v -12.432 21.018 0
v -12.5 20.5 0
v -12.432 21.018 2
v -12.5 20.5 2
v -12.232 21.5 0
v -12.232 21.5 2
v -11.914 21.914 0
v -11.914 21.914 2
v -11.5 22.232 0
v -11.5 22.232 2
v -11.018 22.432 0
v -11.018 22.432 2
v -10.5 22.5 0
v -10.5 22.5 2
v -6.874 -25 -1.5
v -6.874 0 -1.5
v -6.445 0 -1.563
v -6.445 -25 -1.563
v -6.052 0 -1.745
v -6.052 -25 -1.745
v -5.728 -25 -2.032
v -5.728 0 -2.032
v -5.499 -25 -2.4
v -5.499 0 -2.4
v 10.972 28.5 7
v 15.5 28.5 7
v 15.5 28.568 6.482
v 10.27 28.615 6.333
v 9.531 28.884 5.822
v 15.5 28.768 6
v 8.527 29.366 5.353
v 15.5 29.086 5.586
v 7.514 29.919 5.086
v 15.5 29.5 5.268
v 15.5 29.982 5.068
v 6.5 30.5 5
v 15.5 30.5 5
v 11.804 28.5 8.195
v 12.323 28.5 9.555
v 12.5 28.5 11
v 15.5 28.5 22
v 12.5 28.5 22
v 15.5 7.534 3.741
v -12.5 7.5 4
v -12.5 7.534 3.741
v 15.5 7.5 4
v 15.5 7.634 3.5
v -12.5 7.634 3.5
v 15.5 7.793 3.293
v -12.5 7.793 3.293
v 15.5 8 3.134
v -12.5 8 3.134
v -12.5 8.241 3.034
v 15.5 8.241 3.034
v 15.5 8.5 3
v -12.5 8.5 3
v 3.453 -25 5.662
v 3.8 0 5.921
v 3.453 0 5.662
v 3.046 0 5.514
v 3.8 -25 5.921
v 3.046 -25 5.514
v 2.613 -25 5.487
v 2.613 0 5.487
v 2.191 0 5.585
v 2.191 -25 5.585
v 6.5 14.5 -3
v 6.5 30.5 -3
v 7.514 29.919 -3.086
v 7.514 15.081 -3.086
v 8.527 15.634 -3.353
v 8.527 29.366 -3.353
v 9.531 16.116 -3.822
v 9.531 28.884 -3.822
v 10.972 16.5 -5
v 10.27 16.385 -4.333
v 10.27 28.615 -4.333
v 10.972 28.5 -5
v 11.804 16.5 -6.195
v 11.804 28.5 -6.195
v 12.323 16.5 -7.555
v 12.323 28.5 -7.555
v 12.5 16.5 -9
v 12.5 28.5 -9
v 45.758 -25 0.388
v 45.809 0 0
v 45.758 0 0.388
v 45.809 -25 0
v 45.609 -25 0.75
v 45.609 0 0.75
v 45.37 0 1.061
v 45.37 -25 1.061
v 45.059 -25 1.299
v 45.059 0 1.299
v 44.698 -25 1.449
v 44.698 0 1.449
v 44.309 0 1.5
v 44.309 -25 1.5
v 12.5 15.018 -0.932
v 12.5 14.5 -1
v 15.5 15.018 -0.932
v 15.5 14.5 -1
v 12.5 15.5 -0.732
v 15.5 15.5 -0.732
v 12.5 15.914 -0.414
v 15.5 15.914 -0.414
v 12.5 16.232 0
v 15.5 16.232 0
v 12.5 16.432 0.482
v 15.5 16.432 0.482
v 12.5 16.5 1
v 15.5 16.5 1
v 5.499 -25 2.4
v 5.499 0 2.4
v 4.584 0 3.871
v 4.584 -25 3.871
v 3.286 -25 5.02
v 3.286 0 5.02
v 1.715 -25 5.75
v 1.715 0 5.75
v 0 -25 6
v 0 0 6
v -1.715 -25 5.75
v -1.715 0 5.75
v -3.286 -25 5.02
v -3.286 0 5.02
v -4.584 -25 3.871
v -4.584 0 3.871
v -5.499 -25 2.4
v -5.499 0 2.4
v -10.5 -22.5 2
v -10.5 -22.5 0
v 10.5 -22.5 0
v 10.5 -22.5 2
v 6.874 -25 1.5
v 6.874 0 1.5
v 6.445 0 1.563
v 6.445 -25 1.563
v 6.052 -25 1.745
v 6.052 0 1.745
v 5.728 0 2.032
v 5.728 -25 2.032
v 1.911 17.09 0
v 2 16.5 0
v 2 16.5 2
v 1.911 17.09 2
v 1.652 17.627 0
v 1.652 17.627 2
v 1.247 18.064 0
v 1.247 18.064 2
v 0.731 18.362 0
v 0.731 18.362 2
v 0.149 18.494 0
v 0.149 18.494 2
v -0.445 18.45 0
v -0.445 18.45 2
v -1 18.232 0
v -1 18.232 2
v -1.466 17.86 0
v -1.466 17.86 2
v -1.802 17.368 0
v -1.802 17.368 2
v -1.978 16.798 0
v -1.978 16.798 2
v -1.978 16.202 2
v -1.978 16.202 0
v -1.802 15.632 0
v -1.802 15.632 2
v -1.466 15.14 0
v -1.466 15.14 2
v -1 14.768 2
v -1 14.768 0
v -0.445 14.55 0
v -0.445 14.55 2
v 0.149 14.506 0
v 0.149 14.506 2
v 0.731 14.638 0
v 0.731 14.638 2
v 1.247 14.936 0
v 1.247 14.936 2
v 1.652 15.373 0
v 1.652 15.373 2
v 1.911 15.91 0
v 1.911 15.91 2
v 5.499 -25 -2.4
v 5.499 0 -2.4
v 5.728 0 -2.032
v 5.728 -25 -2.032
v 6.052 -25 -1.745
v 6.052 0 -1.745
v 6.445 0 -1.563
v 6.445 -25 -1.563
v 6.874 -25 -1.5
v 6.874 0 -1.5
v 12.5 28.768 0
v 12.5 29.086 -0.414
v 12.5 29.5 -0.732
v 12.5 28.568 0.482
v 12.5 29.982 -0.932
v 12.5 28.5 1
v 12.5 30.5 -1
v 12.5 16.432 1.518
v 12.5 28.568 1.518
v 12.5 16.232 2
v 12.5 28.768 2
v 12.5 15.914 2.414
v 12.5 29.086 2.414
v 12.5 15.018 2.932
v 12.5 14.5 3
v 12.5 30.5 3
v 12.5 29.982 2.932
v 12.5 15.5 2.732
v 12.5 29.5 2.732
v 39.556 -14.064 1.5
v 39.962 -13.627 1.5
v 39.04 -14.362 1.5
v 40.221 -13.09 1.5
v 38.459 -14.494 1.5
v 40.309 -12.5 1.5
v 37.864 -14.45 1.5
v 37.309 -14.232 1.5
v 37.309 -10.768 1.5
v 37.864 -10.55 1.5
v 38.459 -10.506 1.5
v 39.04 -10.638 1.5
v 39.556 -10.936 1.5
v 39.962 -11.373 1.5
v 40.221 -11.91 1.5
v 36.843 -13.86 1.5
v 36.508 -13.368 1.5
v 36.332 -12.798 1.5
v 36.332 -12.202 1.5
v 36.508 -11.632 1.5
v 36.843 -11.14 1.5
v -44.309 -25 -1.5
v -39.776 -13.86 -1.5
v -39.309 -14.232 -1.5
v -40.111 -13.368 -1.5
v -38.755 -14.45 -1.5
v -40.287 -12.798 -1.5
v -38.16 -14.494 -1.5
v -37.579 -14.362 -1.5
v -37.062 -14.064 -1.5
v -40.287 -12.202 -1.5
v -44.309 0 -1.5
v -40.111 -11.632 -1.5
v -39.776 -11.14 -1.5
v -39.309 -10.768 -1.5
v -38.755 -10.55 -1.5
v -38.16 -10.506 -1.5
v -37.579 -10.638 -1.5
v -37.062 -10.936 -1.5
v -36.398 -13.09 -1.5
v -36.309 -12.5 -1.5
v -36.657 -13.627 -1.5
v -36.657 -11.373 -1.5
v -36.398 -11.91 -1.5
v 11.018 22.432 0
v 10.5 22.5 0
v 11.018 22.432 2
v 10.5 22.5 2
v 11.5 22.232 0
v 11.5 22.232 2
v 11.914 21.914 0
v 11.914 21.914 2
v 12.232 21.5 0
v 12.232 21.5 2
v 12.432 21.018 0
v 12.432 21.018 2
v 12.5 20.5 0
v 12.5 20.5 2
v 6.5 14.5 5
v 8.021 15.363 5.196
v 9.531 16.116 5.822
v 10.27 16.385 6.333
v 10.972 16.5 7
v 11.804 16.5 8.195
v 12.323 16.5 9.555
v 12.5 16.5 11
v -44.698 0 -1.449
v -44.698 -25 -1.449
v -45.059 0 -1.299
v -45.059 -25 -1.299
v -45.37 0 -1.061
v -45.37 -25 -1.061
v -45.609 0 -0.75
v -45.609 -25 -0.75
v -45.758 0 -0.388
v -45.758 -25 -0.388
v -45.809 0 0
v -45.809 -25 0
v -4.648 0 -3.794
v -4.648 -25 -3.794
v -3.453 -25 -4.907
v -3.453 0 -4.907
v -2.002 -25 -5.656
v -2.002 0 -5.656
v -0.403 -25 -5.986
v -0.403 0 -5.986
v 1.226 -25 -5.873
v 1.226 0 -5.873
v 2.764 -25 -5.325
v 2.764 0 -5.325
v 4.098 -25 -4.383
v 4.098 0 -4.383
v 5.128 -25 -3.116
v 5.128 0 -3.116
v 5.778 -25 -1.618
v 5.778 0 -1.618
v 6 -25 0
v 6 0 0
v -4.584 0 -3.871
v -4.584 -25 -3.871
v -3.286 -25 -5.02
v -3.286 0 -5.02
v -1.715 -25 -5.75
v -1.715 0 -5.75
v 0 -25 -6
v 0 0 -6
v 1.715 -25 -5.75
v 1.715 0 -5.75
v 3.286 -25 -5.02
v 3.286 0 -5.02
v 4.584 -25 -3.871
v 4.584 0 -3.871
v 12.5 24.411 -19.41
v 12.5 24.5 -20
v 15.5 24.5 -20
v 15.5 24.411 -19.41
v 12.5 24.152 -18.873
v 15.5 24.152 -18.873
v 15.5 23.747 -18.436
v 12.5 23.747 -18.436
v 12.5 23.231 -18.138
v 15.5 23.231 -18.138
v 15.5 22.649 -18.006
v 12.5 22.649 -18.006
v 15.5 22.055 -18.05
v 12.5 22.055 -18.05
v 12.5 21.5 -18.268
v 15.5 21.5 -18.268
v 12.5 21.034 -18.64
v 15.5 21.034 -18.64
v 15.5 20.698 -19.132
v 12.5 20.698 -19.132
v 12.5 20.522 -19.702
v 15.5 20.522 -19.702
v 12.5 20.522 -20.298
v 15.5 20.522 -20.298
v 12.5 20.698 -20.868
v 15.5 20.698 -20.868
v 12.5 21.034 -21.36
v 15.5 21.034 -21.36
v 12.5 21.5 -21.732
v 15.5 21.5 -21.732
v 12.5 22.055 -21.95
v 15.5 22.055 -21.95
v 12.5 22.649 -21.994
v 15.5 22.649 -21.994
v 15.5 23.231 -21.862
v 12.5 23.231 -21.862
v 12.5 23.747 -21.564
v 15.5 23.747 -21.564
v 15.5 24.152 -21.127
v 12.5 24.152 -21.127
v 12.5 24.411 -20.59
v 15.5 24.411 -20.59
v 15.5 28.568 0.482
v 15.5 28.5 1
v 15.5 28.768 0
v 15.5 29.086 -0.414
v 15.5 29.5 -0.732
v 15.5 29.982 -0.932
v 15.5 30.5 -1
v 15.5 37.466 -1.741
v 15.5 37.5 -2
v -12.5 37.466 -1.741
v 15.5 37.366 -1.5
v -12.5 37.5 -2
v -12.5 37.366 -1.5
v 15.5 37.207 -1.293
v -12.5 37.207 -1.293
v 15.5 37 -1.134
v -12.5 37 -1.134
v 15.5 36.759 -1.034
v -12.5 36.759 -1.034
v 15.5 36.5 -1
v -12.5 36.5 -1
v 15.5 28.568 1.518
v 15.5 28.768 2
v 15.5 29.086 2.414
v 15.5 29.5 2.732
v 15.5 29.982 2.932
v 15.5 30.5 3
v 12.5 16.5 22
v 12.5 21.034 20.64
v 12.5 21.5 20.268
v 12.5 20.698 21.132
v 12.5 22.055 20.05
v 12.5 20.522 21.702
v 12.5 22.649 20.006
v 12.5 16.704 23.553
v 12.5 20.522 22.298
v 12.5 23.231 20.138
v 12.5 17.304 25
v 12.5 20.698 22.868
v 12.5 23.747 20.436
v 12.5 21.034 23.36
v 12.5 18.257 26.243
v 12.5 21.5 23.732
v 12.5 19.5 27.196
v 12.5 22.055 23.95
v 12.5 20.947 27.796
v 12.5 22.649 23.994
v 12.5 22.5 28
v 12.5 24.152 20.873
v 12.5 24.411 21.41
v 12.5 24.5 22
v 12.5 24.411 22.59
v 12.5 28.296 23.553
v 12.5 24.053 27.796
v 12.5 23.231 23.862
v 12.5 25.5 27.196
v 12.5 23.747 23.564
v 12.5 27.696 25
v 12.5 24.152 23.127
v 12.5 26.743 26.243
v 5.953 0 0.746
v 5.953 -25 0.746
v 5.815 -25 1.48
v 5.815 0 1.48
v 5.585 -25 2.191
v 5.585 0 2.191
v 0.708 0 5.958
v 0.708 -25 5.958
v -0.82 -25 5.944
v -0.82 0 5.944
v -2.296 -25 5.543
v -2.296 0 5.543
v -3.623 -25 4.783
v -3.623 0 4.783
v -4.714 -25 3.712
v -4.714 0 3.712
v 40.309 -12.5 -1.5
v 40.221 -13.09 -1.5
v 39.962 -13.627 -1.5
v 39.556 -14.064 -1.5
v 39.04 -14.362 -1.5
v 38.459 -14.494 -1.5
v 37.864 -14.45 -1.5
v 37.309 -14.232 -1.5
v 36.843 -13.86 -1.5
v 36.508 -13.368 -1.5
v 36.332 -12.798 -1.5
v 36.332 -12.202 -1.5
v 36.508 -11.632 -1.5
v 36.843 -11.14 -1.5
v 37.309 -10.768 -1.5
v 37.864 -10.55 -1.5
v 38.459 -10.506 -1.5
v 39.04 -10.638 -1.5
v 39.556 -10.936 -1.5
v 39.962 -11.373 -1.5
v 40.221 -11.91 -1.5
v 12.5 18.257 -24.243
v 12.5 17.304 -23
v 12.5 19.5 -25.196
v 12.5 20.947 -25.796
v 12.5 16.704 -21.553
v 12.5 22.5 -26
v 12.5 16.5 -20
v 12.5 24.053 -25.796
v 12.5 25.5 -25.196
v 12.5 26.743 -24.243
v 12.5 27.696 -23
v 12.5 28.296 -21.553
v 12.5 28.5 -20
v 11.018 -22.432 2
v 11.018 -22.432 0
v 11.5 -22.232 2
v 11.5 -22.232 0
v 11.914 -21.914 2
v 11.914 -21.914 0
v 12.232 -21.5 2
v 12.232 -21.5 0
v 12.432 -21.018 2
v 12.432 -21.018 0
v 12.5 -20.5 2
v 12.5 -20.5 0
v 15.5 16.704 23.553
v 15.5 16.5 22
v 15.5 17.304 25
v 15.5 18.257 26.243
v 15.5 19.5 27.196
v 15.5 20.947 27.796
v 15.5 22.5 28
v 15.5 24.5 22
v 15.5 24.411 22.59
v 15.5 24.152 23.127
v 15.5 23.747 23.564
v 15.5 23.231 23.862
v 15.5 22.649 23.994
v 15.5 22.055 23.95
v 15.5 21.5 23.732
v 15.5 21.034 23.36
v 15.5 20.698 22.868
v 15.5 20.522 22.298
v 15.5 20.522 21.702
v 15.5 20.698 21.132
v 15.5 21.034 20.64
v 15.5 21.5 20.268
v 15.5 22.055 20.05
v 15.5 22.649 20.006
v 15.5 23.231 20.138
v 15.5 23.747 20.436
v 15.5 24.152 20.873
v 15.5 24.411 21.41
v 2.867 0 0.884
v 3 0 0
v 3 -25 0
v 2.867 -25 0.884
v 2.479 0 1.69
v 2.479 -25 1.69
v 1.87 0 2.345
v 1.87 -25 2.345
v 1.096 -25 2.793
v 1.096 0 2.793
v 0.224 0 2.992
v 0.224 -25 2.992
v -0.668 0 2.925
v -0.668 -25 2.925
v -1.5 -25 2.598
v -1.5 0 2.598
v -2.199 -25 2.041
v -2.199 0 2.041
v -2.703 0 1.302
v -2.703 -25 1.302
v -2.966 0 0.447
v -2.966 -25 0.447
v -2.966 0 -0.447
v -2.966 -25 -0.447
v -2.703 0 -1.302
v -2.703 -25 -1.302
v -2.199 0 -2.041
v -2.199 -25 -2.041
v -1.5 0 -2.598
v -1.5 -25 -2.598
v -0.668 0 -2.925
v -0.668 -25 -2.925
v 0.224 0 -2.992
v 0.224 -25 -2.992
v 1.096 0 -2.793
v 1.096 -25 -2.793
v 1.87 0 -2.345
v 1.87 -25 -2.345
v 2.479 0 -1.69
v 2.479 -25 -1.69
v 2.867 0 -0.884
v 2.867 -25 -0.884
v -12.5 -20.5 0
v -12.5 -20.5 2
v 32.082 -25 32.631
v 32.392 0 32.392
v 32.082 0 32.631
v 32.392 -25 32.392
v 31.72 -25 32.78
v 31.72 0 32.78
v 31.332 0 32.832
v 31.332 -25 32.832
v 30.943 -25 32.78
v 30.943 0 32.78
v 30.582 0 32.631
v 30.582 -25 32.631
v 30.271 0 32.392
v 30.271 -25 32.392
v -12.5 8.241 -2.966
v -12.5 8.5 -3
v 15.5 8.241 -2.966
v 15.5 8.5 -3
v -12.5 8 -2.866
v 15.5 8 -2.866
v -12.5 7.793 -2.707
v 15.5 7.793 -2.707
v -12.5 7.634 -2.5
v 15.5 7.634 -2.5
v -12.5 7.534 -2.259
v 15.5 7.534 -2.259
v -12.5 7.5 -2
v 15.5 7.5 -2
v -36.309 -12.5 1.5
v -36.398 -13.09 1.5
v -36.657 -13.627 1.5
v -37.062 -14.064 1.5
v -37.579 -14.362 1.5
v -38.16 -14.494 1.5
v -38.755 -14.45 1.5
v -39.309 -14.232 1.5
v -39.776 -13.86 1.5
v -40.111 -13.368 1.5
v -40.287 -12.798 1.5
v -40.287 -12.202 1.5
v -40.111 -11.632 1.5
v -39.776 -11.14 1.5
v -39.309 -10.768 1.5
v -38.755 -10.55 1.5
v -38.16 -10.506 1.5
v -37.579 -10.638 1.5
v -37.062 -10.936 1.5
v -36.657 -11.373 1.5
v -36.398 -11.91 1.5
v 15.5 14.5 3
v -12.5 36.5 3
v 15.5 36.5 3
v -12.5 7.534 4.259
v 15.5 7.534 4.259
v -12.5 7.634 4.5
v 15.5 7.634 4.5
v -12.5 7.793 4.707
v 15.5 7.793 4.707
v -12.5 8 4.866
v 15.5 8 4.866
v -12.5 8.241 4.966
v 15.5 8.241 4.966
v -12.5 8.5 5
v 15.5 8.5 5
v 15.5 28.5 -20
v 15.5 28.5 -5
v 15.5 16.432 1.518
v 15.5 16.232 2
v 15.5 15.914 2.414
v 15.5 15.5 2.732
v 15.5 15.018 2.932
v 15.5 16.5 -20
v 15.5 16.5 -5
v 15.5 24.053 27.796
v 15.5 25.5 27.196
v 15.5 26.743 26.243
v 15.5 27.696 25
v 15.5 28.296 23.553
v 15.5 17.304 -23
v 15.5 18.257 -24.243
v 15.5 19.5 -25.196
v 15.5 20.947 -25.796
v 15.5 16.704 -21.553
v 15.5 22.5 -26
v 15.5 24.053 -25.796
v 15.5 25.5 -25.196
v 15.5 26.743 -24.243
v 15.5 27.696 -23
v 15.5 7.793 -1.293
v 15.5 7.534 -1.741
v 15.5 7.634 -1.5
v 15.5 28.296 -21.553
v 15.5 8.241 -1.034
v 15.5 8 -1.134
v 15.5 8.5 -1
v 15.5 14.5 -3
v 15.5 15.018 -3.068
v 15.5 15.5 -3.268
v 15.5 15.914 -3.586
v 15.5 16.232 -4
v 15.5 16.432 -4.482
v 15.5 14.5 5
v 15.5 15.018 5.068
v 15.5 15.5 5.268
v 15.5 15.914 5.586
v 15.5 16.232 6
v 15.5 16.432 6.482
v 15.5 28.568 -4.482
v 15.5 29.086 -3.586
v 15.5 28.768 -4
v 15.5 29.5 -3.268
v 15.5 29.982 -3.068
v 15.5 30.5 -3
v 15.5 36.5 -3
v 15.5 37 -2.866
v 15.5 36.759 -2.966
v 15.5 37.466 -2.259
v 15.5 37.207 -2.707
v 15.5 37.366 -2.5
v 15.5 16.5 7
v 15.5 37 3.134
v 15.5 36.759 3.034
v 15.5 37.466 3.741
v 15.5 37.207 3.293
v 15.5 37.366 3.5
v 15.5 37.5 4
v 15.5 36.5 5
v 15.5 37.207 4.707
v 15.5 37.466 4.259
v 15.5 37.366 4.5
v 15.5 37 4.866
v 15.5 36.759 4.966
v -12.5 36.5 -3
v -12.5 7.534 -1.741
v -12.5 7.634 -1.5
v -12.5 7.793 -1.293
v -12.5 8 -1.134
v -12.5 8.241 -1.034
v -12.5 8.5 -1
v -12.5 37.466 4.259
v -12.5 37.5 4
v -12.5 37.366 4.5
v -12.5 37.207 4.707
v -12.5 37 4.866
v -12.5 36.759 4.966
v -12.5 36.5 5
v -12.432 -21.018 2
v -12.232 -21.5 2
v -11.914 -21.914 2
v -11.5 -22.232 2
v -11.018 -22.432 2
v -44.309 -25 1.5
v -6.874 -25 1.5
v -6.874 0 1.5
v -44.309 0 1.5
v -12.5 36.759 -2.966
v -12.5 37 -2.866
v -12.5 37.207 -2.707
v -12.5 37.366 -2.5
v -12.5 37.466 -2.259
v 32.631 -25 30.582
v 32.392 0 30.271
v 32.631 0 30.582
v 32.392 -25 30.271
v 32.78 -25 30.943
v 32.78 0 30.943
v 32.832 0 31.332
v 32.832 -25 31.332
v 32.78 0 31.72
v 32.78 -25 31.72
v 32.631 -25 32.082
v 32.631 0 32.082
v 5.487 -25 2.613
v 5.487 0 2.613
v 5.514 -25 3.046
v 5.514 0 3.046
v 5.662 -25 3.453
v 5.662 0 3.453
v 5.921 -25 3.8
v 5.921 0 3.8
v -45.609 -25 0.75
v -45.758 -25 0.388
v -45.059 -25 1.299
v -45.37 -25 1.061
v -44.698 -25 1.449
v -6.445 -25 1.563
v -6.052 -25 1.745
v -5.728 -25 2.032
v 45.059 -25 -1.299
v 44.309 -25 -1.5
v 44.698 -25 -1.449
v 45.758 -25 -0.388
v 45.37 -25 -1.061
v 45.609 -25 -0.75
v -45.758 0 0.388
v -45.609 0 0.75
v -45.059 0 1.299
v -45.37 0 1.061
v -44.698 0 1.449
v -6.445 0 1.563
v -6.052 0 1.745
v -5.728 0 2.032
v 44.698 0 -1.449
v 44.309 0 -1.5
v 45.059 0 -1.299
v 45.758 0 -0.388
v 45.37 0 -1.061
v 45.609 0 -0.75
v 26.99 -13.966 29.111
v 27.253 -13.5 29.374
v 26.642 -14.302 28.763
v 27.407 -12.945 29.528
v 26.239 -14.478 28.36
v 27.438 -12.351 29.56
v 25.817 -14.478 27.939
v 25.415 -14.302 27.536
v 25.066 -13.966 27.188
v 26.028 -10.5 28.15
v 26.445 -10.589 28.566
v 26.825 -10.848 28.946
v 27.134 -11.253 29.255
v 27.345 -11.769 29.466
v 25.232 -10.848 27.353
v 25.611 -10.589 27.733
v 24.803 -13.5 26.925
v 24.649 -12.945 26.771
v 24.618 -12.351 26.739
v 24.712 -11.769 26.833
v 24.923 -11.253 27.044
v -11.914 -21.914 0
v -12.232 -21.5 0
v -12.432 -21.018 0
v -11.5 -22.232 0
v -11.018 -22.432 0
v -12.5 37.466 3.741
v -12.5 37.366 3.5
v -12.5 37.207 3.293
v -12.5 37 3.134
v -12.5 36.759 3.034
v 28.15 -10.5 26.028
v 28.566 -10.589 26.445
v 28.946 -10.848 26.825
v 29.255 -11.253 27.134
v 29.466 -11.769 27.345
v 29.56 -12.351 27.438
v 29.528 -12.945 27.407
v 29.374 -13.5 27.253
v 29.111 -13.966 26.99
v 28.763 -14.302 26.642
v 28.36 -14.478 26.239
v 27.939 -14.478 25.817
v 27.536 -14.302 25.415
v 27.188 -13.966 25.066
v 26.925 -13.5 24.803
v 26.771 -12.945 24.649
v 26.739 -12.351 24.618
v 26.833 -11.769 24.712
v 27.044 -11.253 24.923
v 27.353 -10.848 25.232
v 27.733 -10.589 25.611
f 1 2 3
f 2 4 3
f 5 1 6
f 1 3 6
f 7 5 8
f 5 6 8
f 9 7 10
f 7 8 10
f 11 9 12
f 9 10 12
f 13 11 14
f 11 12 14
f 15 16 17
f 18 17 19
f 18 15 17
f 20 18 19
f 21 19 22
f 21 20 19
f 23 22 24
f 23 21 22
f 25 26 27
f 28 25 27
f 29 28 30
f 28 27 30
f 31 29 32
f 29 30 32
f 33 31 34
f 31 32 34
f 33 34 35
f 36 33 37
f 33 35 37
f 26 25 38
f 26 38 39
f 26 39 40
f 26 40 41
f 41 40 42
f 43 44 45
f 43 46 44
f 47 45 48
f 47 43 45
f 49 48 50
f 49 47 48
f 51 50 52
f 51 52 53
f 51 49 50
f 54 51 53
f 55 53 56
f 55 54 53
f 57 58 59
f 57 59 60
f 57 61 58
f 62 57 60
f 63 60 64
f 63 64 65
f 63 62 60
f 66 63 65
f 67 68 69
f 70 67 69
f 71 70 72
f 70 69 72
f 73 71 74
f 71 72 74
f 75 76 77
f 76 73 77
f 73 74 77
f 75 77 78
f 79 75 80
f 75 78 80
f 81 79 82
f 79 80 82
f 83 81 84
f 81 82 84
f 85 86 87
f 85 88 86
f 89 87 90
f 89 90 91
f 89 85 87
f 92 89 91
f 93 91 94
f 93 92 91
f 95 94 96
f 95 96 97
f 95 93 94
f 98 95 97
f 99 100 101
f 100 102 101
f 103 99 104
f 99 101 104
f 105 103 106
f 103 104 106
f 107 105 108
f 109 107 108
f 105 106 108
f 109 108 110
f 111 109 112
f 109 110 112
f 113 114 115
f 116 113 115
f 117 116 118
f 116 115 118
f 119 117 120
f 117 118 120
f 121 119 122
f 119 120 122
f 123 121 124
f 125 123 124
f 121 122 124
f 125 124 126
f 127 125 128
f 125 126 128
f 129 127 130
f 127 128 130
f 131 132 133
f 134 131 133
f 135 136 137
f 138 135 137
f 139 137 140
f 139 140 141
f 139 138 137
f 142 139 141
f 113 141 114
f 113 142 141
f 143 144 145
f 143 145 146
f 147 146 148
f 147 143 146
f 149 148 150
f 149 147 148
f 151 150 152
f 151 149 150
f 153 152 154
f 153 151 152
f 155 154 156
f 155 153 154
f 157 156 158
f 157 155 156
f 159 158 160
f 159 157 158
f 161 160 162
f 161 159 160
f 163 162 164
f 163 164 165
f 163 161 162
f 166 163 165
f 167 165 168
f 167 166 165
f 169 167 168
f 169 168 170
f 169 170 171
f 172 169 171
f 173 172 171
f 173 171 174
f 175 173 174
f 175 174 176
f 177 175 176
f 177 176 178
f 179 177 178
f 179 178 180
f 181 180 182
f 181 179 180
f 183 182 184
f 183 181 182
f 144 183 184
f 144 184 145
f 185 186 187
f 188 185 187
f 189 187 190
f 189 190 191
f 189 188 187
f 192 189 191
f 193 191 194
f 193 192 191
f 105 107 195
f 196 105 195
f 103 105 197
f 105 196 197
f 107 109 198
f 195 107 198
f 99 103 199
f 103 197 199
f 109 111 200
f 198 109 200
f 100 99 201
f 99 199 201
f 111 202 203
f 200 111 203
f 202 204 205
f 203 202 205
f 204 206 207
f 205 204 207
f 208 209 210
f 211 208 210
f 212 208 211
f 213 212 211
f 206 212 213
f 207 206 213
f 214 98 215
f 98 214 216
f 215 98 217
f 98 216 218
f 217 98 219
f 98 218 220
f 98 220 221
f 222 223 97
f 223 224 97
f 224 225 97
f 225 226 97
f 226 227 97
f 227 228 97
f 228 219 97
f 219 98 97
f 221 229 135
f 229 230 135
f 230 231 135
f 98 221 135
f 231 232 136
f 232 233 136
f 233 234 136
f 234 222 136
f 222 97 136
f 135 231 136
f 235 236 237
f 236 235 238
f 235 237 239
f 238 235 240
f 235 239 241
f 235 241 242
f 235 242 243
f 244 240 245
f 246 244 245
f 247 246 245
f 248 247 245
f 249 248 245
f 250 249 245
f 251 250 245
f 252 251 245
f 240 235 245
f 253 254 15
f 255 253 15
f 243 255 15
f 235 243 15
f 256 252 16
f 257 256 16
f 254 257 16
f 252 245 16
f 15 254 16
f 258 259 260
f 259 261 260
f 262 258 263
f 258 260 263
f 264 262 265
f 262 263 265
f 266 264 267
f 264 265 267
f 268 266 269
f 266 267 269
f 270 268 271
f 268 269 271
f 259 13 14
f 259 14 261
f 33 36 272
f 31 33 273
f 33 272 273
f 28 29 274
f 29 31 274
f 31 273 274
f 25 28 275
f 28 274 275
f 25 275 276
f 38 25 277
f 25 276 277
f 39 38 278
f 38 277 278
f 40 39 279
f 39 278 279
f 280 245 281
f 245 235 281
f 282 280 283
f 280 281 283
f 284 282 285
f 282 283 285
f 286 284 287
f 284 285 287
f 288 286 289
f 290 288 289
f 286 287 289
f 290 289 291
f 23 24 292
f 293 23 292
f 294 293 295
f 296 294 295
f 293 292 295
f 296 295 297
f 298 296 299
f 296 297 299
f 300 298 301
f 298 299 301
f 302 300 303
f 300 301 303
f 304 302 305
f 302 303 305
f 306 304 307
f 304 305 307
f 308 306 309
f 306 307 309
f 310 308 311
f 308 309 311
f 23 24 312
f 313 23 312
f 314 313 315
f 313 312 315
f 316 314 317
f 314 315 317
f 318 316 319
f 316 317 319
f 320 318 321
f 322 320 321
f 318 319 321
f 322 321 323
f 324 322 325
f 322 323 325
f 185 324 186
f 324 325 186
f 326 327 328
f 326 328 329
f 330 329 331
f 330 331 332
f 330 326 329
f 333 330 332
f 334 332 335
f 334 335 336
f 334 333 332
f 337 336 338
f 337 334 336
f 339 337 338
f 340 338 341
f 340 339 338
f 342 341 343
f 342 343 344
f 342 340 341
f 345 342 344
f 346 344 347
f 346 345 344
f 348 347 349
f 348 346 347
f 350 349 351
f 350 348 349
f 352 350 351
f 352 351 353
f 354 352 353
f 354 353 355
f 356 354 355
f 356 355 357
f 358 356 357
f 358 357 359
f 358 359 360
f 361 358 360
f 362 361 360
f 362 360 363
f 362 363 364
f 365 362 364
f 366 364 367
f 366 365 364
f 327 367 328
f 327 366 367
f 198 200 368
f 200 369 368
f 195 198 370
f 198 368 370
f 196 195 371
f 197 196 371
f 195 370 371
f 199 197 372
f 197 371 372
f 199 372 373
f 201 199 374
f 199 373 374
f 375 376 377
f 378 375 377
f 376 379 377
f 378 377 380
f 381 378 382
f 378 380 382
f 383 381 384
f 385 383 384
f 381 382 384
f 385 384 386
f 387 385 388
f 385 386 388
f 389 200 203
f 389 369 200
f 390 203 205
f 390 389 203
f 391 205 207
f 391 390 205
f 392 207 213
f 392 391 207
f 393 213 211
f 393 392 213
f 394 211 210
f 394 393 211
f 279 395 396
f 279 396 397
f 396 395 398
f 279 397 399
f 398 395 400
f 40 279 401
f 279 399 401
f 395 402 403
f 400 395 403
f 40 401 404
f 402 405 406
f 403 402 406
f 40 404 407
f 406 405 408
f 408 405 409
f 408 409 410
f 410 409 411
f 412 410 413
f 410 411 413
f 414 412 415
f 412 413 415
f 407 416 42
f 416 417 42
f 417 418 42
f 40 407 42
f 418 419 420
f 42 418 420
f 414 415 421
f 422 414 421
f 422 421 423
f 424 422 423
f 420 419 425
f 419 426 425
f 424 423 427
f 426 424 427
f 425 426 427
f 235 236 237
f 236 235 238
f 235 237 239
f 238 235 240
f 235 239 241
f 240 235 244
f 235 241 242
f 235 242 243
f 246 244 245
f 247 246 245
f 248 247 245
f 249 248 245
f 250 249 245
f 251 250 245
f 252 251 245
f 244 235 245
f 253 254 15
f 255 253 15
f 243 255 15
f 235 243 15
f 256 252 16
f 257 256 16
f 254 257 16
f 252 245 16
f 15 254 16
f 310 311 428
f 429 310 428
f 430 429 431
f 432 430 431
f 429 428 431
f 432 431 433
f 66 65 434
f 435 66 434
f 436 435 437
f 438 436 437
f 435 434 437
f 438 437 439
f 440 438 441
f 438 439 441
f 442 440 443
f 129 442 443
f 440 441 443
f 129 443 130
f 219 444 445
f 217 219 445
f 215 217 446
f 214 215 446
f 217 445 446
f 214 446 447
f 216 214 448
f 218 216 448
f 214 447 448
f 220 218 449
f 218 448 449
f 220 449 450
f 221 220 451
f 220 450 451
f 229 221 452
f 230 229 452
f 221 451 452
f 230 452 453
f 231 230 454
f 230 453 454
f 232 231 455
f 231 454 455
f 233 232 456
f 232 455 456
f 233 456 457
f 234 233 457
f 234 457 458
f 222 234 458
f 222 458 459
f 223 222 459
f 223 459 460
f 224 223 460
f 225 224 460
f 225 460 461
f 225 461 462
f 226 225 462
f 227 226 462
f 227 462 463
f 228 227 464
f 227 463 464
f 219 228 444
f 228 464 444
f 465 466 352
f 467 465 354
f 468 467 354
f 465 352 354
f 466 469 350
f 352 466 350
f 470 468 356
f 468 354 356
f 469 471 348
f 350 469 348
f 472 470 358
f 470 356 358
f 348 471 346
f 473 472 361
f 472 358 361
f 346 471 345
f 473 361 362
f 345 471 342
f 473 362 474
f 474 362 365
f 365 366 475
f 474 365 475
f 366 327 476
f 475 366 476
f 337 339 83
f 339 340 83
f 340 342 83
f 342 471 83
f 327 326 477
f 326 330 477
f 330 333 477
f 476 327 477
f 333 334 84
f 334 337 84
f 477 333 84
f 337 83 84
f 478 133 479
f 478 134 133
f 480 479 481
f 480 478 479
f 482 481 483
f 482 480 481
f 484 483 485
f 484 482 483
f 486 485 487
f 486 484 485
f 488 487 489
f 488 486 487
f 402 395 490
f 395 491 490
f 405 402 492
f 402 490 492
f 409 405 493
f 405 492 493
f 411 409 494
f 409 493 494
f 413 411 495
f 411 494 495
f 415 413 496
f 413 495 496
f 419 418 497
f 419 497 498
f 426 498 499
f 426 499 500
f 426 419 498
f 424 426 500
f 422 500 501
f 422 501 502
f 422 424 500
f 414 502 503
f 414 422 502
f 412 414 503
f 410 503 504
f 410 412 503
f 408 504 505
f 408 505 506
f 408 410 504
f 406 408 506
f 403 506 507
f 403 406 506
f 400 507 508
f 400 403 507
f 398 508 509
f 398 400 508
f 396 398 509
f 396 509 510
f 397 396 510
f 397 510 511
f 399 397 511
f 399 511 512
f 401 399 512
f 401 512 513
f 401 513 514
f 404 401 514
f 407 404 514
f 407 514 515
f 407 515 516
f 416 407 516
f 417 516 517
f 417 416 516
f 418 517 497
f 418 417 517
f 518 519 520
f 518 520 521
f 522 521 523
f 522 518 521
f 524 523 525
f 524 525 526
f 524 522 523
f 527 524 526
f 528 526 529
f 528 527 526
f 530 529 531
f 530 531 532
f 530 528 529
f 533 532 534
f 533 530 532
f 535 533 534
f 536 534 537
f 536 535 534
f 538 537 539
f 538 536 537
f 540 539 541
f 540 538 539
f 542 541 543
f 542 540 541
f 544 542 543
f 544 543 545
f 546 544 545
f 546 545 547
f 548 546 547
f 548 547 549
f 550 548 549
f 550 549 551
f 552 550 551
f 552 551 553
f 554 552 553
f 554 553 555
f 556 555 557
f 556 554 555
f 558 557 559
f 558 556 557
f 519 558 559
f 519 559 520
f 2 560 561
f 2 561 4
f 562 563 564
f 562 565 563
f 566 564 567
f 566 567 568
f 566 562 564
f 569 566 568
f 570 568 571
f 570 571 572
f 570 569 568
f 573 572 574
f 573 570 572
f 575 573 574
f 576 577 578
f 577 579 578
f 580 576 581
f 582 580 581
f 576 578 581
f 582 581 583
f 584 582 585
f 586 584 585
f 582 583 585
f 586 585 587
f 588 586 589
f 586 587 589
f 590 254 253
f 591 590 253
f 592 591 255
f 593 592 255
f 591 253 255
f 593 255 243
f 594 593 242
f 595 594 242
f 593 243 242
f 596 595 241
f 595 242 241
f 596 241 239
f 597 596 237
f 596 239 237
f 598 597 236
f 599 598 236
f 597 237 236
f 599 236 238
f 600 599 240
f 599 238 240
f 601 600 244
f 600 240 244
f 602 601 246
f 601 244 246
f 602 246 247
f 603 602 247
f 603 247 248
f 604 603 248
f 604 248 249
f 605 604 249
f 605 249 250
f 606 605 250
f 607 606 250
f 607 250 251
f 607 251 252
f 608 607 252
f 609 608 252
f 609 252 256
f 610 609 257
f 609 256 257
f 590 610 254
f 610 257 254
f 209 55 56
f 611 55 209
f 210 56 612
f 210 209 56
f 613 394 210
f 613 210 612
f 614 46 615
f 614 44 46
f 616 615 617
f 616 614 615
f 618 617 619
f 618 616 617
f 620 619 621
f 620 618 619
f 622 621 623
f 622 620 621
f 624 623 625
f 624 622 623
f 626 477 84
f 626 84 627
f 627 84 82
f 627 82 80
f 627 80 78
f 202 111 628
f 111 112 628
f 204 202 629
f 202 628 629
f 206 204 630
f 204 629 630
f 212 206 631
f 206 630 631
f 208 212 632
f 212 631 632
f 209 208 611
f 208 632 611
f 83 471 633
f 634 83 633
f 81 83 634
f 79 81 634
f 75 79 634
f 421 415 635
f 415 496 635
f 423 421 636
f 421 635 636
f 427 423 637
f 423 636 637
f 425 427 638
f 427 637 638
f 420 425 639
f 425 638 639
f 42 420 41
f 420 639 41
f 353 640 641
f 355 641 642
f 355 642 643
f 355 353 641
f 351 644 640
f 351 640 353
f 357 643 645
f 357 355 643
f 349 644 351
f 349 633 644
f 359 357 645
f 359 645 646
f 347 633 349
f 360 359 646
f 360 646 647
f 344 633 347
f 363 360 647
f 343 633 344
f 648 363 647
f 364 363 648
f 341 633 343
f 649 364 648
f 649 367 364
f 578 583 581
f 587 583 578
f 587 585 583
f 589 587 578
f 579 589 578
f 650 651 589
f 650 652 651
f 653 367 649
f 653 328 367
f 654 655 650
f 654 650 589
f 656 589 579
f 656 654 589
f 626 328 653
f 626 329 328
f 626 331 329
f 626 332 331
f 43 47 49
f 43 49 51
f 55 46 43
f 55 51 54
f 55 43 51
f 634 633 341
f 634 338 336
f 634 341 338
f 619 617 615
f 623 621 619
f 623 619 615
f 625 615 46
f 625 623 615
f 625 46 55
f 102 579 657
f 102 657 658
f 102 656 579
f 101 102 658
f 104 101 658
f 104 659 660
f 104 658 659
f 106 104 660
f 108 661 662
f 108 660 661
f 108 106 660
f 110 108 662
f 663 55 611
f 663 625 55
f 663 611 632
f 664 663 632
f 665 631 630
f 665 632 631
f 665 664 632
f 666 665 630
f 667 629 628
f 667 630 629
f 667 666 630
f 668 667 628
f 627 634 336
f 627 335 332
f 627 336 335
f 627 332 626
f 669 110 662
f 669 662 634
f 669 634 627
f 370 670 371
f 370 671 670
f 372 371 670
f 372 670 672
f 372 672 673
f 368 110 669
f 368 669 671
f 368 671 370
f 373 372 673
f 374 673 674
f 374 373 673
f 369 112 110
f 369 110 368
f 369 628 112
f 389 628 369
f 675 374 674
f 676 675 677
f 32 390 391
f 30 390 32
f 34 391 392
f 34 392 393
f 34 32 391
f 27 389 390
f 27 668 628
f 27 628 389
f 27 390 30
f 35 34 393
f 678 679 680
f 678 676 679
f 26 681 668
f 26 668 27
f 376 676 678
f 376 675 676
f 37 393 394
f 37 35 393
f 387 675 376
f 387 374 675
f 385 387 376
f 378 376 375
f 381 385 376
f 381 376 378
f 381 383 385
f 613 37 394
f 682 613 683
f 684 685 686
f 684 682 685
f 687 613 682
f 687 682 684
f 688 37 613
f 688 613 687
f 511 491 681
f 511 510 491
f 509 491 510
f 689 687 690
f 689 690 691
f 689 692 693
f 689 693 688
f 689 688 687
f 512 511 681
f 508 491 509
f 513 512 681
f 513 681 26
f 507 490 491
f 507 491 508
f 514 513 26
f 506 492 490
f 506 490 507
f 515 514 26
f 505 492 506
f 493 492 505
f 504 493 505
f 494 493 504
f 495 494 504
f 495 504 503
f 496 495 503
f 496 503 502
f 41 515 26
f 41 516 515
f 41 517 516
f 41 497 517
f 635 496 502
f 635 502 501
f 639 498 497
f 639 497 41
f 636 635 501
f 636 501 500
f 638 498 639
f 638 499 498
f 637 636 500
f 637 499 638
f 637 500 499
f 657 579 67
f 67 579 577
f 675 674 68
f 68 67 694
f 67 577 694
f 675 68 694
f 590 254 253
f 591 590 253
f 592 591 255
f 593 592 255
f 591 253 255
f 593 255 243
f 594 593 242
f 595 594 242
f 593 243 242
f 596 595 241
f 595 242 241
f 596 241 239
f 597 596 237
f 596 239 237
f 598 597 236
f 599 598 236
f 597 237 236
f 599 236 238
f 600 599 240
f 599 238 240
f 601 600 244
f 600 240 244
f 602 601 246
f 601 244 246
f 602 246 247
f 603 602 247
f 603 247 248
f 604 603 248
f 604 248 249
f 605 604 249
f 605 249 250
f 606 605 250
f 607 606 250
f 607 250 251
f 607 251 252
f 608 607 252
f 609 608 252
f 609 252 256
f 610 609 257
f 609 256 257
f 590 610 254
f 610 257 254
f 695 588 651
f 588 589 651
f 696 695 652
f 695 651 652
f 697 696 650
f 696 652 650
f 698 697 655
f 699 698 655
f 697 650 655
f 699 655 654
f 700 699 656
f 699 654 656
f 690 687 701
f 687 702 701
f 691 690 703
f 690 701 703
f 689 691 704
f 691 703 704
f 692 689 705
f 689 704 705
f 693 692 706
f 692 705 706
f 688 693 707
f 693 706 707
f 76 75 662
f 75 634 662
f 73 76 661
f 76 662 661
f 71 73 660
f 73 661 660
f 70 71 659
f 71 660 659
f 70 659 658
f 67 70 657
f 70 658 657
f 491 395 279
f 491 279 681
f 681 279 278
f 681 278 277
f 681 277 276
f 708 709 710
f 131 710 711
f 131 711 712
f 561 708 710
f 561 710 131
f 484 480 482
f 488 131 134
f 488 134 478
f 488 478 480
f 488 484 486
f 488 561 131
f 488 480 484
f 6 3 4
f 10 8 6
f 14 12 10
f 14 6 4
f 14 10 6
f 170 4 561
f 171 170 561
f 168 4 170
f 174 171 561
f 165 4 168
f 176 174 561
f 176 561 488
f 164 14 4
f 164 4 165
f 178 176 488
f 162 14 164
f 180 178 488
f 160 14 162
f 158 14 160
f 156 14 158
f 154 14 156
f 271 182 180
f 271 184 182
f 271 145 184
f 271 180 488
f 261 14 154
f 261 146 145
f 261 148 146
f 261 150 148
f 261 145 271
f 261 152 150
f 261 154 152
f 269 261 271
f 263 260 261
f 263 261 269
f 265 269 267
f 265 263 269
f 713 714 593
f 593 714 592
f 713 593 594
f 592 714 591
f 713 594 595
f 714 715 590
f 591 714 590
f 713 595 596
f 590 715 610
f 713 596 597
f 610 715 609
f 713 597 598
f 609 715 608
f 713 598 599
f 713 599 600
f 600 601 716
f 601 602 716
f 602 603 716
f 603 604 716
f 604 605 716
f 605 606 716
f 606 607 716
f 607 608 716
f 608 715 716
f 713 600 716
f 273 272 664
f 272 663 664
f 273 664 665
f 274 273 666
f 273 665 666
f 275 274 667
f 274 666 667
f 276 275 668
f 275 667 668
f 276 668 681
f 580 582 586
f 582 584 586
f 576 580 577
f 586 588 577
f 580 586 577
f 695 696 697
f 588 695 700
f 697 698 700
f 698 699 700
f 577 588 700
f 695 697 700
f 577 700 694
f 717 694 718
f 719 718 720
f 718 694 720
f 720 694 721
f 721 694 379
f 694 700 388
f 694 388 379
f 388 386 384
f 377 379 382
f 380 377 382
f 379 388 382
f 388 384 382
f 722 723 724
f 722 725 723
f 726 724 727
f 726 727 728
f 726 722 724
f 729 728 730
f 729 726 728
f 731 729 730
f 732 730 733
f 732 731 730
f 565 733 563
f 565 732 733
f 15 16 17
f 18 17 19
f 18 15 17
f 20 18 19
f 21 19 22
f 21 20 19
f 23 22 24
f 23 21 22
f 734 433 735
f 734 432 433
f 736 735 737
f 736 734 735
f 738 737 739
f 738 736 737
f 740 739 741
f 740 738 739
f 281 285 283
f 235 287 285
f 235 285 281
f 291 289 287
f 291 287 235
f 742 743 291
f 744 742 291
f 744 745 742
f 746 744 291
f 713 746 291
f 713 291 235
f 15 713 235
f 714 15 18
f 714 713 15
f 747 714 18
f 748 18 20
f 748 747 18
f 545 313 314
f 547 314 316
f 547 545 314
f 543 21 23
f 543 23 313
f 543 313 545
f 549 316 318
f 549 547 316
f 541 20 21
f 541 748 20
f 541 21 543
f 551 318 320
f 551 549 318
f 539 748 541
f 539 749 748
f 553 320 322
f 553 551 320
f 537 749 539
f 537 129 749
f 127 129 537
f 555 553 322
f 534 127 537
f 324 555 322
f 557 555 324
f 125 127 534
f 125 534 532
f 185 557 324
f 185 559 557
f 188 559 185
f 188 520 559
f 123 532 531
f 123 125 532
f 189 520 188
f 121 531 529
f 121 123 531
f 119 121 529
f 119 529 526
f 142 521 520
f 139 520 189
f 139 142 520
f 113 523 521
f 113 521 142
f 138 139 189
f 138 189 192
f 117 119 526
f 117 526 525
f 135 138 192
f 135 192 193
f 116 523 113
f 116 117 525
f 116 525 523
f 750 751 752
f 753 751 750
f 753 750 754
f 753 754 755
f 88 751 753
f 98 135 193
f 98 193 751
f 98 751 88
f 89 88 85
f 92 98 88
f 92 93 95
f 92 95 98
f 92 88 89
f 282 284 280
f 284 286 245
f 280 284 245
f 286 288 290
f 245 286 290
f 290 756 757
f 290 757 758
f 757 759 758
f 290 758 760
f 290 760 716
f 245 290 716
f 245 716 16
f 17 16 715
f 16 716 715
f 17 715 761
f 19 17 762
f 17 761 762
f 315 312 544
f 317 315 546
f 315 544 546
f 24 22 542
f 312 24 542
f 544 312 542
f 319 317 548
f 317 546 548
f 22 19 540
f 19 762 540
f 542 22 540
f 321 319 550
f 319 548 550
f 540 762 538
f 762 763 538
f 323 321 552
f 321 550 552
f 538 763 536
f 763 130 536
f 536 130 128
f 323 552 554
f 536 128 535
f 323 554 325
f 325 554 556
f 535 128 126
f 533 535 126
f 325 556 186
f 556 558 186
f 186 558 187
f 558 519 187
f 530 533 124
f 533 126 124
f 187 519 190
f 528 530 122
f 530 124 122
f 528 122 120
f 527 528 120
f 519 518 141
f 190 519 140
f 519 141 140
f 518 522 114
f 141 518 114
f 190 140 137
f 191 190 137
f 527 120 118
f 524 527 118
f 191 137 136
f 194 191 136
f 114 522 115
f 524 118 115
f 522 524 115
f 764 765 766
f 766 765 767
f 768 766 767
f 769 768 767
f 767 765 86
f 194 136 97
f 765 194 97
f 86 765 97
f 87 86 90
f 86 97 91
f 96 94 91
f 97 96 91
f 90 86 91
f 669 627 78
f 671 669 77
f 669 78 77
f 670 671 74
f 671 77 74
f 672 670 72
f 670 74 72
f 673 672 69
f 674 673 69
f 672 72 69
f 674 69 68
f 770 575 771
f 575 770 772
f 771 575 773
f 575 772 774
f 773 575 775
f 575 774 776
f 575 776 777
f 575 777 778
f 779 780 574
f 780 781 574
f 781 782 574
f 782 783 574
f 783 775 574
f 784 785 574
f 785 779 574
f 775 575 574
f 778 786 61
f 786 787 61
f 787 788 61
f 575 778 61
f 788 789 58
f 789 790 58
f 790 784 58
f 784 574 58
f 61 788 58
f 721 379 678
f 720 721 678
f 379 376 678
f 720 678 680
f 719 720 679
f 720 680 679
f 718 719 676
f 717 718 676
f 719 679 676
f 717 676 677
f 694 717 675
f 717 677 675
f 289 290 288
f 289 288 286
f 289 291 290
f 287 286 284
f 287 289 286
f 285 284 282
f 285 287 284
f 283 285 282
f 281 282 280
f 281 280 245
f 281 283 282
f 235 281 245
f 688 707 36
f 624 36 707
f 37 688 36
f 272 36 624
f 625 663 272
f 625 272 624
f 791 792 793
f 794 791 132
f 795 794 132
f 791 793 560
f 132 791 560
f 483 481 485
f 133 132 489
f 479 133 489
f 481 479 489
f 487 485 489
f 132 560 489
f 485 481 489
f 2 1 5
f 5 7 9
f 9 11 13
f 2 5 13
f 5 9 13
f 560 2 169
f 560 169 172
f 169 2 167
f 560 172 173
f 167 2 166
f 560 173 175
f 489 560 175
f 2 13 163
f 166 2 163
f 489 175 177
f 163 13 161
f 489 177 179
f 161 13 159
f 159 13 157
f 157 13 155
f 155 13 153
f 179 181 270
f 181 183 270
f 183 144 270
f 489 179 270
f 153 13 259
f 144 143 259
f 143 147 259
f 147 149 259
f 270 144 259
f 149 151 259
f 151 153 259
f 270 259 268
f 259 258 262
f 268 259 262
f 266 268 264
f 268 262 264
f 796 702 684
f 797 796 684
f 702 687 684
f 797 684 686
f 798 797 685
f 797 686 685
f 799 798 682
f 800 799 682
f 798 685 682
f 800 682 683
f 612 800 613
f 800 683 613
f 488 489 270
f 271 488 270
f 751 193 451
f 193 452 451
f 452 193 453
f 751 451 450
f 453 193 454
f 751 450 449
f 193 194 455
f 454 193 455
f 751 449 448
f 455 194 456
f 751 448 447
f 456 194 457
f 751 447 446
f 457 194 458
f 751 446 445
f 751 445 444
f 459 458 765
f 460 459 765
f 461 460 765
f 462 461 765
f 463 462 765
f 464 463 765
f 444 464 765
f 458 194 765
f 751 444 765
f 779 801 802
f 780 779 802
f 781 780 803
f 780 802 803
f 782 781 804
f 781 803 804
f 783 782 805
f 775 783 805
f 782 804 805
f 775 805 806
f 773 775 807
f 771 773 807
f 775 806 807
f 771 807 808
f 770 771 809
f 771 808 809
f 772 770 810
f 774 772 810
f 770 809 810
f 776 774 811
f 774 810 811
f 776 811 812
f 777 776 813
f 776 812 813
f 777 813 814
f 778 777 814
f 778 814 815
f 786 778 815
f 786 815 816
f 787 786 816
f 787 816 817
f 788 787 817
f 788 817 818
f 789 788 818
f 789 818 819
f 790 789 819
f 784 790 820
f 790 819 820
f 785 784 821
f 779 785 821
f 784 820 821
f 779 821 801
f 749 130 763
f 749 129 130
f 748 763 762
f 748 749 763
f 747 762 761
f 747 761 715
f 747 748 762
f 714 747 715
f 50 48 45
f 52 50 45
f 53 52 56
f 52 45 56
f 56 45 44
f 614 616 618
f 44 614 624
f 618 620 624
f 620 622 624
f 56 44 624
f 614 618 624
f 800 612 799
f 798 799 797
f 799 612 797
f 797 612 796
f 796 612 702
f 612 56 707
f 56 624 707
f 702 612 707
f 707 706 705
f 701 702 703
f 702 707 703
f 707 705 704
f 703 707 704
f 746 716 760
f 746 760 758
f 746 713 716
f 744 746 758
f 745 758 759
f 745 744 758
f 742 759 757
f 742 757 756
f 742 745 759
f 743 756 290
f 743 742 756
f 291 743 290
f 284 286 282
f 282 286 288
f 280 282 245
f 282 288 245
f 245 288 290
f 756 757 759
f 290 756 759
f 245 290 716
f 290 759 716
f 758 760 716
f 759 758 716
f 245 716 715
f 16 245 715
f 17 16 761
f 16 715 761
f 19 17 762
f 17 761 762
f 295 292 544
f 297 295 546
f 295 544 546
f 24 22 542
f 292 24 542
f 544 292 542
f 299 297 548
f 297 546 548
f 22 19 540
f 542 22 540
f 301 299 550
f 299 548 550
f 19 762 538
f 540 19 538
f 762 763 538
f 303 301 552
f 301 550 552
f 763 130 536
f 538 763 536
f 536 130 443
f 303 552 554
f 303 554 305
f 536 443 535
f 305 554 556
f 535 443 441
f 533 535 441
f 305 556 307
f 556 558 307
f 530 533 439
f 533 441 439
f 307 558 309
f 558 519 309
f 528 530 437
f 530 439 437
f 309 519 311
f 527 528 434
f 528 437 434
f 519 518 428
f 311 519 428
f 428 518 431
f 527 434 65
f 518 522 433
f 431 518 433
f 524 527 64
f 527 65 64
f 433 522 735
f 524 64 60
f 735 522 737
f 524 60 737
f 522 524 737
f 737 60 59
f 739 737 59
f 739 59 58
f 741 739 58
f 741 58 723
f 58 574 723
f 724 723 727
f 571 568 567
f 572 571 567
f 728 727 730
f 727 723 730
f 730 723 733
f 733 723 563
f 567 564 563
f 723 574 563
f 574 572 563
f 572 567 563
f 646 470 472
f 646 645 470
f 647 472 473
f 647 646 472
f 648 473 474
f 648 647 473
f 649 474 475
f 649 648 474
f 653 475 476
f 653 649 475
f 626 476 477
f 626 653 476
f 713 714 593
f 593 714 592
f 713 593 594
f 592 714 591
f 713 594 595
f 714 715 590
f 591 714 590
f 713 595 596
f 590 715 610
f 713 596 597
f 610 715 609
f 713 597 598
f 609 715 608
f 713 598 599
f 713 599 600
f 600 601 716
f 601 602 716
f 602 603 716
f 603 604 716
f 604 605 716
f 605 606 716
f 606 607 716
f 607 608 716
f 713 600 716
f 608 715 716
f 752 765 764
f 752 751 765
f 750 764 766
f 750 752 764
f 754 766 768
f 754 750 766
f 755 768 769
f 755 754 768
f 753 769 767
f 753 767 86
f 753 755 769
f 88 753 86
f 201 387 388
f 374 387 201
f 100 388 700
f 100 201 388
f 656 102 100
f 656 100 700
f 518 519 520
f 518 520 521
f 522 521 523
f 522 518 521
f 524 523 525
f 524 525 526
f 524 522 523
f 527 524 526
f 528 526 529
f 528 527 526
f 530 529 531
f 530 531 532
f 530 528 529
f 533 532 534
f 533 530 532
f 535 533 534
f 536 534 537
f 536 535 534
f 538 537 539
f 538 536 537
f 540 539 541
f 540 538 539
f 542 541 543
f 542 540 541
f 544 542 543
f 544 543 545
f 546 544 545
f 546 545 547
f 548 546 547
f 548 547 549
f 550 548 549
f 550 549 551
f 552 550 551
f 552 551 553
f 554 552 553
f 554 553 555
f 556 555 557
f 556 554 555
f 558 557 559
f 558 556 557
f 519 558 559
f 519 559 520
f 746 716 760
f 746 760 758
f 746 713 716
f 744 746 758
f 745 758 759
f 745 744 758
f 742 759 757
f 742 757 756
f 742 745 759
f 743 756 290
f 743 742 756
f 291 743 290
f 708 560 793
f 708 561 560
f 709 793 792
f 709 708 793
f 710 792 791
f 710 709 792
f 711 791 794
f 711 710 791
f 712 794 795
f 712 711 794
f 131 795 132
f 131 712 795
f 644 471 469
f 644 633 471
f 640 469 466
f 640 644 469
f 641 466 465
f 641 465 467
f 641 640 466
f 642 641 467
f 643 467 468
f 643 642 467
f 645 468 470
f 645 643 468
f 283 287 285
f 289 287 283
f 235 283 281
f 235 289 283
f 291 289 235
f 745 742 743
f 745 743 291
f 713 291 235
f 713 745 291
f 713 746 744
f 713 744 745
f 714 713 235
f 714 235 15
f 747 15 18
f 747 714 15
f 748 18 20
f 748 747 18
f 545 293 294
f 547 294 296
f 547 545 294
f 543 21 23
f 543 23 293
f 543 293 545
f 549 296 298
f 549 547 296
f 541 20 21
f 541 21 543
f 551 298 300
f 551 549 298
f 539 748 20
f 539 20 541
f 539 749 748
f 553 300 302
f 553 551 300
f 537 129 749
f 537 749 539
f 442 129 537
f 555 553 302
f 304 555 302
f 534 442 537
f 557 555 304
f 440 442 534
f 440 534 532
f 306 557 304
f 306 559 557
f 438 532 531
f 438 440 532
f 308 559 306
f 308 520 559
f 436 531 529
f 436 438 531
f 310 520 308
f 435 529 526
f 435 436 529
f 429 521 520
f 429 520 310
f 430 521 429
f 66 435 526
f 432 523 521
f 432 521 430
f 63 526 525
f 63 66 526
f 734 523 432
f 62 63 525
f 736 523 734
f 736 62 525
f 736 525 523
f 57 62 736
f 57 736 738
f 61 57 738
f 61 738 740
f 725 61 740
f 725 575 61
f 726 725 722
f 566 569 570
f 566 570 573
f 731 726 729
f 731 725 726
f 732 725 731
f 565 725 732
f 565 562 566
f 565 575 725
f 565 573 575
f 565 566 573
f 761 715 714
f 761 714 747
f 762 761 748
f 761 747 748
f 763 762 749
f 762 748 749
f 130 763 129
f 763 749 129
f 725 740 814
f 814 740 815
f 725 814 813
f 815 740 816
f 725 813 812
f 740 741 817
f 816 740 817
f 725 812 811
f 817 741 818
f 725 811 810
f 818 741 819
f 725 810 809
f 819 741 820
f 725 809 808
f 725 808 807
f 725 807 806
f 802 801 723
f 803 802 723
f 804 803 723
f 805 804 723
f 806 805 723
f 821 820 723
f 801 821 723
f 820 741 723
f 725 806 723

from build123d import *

# Parameters (mm, degrees)
F0_R      = 3
F1_DEPTH  = 25
F2_R      = 1.49999
F3_R      = 3
F4_DEPTH  = 25
F5_R      = 1.49999
F7_R      = 2
F8_DEPTH  = 3
F6_R      = 2
F9_R      = 2
F10_DEPTH = 3
F11_W     = 25
F11_H     = 45
F11_R     = 2
F12_DEPTH = 2
F13_W     = 12
F13_H     = 23
F13_R     = 2
F13_W_2   = 9
F13_H_2   = 2
F13_W_3   = 6
F14_DEPTH = 3
F15_DEPTH = 25
F16_R     = 0.99999
F17_R     = 5.99999
F18_R     = 1.99999
F19_R     = 2


# Not quite as in the source:
# - a fillet or chamfer is up to 0.001 mm smaller than in the source, because OpenCascade refuses the exact size


with BuildPart() as f1:
    # F0 (on Front) → F1 (new body)
    with BuildSketch(Plane.XZ):
        with BuildLine():
            ThreePointArc((-5.8094750193, -1.5), (-6, 0), (-5.8094750193, 1.5))
            Line((-5.8094750193, 1.5), (-45.8094750193, 1.5))
            Line((-45.8094750193, 1.5), (-45.8094750193, -1.5))
            Line((-45.8094750193, -1.5), (-5.8094750193, -1.5))
        make_face()
        with BuildLine():
            ThreePointArc((5.8094750193, -1.5), (5.9521781776, -0.7560257549), (6, 0))
            ThreePointArc((6, 0), (5.9521781776, 0.7560257549), (5.8094750193, 1.5))
            ThreePointArc((5.8094750193, 1.5), (0, 6), (-5.8094750193, 1.5))
            ThreePointArc((-5.8094750193, 1.5), (-6, 0), (-5.8094750193, -1.5))
            ThreePointArc((-5.8094750193, -1.5), (0, -6), (5.8094750193, -1.5))
        make_face()
        Circle(F0_R, mode=Mode.SUBTRACT)
        with BuildLine():
            ThreePointArc((5.8094750193, 1.5), (5.9521781776, 0.7560257549), (6, 0))
            ThreePointArc((6, 0), (5.9521781776, -0.7560257549), (5.8094750193, -1.5))
            Line((5.8094750193, -1.5), (45.8094750193, -1.5))
            Line((45.8094750193, -1.5), (45.8094750193, 1.5))
            Line((45.8094750193, 1.5), (5.8094750193, 1.5))
        make_face()
    extrude(amount=F1_DEPTH)

    # F2 (radius 1.5 in the source; OpenCascade refuses exactly that, so slightly less here)
    f2_edges = [f1.edges().sort_by_distance(p)[0] for p in [
        (-45.809475, -12.5, 1.5),
        (-45.809475, -12.5, -1.5),
        (45.809475, -12.5, 1.5),
        (45.809475, -12.5, -1.5),
        (-5.809475, -12.5, 1.5),
        (5.809475, -12.5, 1.5),
        (-5.809475, -12.5, -1.5),
        (5.809475, -12.5, -1.5),
    ]]
    fillet(f2_edges, radius=F2_R)


with BuildPart() as f4:
    # F3 (on Front) → F4 (new body)
    with BuildSketch(Plane.XZ):
        with BuildLine():
            Line((-45.8094750193, -1.5), (-5.8094750193, -1.5))
            ThreePointArc((-5.8094750193, -1.5), (-6, 0), (-5.8094750193, 1.5))
            Line((-5.8094750193, 1.5), (-45.8094750193, 1.5))
            Line((-45.8094750193, 1.5), (-45.8094750193, -1.5))
        make_face()
        with BuildLine():
            ThreePointArc((-5.8094750193, -1.5), (0.7560257549, -5.9521781776), (6, 0))
            ThreePointArc((6, 0), (5.788414123, 1.5793232541), (5.1685793531, 3.0472590095))
            ThreePointArc((5.1685793531, 3.0472590095), (4.2426406871, 4.2426406871), (3.0472590095, 5.1685793531))
            ThreePointArc((3.0472590095, 5.1685793531), (-2.2961005942, 5.5432771951), (-5.8094750193, 1.5))
            ThreePointArc((-5.8094750193, 1.5), (-6, 0), (-5.8094750193, -1.5))
        make_face()
        Circle(F3_R, mode=Mode.SUBTRACT)
        with BuildLine():
            ThreePointArc((3.0472590095, 5.1685793531), (4.2426406871, 4.2426406871), (5.1685793531, 3.0472590095))
            Line((5.1685793531, 3.0472590095), (33.4528506005, 31.331530257))
            Line((33.4528506005, 31.331530257), (31.331530257, 33.4528506005))
            Line((31.331530257, 33.4528506005), (3.0472590095, 5.1685793531))
        make_face()
    extrude(amount=F4_DEPTH)

    # F5 (radius 1.5 in the source; OpenCascade refuses exactly that, so slightly less here)
    f5_edges = [f4.edges().sort_by_distance(p)[0] for p in [
        (-45.809475, -12.5, 1.5),
        (-5.809475, -12.5, 1.5),
        (3.047259, -12.5, 5.168579),
        (31.33153, -12.5, 33.452851),
        (33.452851, -12.5, 31.33153),
        (-45.809475, -12.5, -1.5),
        (-5.809475, -12.5, -1.5),
        (5.168579, -12.5, 3.047259),
    ]]
    fillet(f5_edges, radius=F5_R)

    # F7 (on face) → F8 (cut, through all)
    with BuildSketch(Plane(origin=(1.0606601718, 0, -1.0606601718), x_dir=(0, 1, 0), z_dir=(0.7071067812, 0, -0.7071067812))):
        with Locations((-12.5, 38.3094750193)):
            Circle(F7_R)
    extrude(amount=-F8_DEPTH, mode=Mode.SUBTRACT)


with BuildPart() as f10_tool:
    # F6 (on face) + F9 (on face) → F10 (new body, through all)
    with BuildSketch(Plane(origin=(0, 0, -1.5), x_dir=(1, 0, 0), z_dir=(0, 0, -1))):
        with Locations((-38.3094750193, 12.5)):
            Circle(F6_R)
    with BuildSketch(Plane(origin=(0, 0, -1.5), x_dir=(1, 0, 0), z_dir=(0, 0, -1))):
        with Locations((38.3094750193, 12.5)):
            Circle(F9_R)
    extrude(amount=-F10_DEPTH)


with BuildPart() as f1_1:
    add(f1.part)

    # F10: cut by f10_tool
    add(f10_tool.part, mode=Mode.SUBTRACT)


with BuildPart() as f4_1:
    add(f4.part)

    # F10: cut by f10_tool
    add(f10_tool.part, mode=Mode.SUBTRACT)


with BuildPart() as f12:
    # F11 (on Top) → F12 (new body)
    with BuildSketch(Plane.XY):
        Rectangle(F11_W, F11_H)
        with Locations((0, 16.5)):
            Circle(F11_R, mode=Mode.SUBTRACT)
    extrude(amount=F12_DEPTH)

    # F19
    f19_edges = [f12.edges().sort_by_distance(p)[0] for p in [
        (-12.5, -22.5, 1),
        (12.5, -22.5, 1),
        (12.5, 22.5, 1),
        (-12.5, 22.5, 1),
    ]]
    fillet(f19_edges, radius=F19_R)


with BuildPart() as f14:
    # F13 (on face) → F14 (new body)
    with BuildSketch(Plane.YZ.offset(12.5)):
        with Locations((22.5, 16.5)):
            Rectangle(F13_W, F13_H)
        with Locations((22.5, 22)):
            Circle(F13_R, mode=Mode.SUBTRACT)
        with Locations((22.5, -14.5)):
            Rectangle(F13_W, F13_H)
        with Locations((22.5, -20)):
            Circle(F13_R, mode=Mode.SUBTRACT)
        with Locations((33, 4)):
            Rectangle(F13_W_2, F13_H_2)
        with Locations((22.5, 4)):
            Rectangle(F13_W, F13_H_2)
        with Locations((12, 4)):
            Rectangle(F13_W_2, F13_H_2)
        with Locations((12, -2)):
            Rectangle(F13_W_2, F13_H_2)
        with Locations((22.5, -2)):
            Rectangle(F13_W, F13_H_2)
        with Locations((33, -2)):
            Rectangle(F13_W_2, F13_H_2)
        with Locations((19.5, 1)):
            Rectangle(F13_W_3, F13_H_2)
        Polygon((22.5, 2), (22.5, 0), (16.5, 0), (16.5, -1), (28.5, -1), (28.5, 3), (16.5, 3), (16.5, 2), align=None)
    extrude(amount=F14_DEPTH)

    # F13 (on face) → F15 (join, through all)
    with BuildSketch(Plane.YZ.offset(12.5)):
        with Locations((22.5, 4)):
            Rectangle(F13_W, F13_H_2)
        with Locations((12, 4)):
            Rectangle(F13_W_2, F13_H_2)
        with Locations((33, 4)):
            Rectangle(F13_W_2, F13_H_2)
        with Locations((33, -2)):
            Rectangle(F13_W_2, F13_H_2)
        with Locations((22.5, -2)):
            Rectangle(F13_W, F13_H_2)
        with Locations((12, -2)):
            Rectangle(F13_W_2, F13_H_2)
    extrude(amount=-F15_DEPTH)

    # F16 (radius 1 in the source; OpenCascade refuses exactly that, so slightly less here)
    f16_edges = [f14.edges().sort_by_distance(p)[0] for p in [
        (1.5, 7.5, 5),
        (1.5, 7.5, 3),
        (1.5, 37.5, 5),
        (1.5, 37.5, 3),
        (1.5, 37.5, -1),
        (1.5, 37.5, -3),
        (1.5, 7.5, -3),
        (1.5, 7.5, -1),
    ]]
    fillet(f16_edges, radius=F16_R)

    # F17 (radius 6 in the source; OpenCascade refuses exactly that, so slightly less here)
    f17_edges = [f14.edges().sort_by_distance(p)[0] for p in [
        (14, 16.5, -26),
        (14, 28.5, -26),
        (12.5, 22.5, -3),
        (12.5, 22.5, 5),
        (14, 28.5, 28),
        (14, 16.5, 28),
    ]]
    fillet(f17_edges, radius=F17_R)

    # F18 (radius 2 in the source; OpenCascade refuses exactly that, so slightly less here)
    f18_edges = [f14.edges().sort_by_distance(p)[0] for p in [
        (14, 28.5, -3),
        (14, 16.5, -3),
        (14, 28.5, 5),
        (14, 16.5, 5),
        (14, 28.5, 3),
        (14, 28.5, -1),
        (14, 16.5, 3),
        (14, 16.5, -1),
    ]]
    fillet(f18_edges, radius=F18_R)


solid = Compound([f1_1.part, f4_1.part, f12.part, f14.part])
